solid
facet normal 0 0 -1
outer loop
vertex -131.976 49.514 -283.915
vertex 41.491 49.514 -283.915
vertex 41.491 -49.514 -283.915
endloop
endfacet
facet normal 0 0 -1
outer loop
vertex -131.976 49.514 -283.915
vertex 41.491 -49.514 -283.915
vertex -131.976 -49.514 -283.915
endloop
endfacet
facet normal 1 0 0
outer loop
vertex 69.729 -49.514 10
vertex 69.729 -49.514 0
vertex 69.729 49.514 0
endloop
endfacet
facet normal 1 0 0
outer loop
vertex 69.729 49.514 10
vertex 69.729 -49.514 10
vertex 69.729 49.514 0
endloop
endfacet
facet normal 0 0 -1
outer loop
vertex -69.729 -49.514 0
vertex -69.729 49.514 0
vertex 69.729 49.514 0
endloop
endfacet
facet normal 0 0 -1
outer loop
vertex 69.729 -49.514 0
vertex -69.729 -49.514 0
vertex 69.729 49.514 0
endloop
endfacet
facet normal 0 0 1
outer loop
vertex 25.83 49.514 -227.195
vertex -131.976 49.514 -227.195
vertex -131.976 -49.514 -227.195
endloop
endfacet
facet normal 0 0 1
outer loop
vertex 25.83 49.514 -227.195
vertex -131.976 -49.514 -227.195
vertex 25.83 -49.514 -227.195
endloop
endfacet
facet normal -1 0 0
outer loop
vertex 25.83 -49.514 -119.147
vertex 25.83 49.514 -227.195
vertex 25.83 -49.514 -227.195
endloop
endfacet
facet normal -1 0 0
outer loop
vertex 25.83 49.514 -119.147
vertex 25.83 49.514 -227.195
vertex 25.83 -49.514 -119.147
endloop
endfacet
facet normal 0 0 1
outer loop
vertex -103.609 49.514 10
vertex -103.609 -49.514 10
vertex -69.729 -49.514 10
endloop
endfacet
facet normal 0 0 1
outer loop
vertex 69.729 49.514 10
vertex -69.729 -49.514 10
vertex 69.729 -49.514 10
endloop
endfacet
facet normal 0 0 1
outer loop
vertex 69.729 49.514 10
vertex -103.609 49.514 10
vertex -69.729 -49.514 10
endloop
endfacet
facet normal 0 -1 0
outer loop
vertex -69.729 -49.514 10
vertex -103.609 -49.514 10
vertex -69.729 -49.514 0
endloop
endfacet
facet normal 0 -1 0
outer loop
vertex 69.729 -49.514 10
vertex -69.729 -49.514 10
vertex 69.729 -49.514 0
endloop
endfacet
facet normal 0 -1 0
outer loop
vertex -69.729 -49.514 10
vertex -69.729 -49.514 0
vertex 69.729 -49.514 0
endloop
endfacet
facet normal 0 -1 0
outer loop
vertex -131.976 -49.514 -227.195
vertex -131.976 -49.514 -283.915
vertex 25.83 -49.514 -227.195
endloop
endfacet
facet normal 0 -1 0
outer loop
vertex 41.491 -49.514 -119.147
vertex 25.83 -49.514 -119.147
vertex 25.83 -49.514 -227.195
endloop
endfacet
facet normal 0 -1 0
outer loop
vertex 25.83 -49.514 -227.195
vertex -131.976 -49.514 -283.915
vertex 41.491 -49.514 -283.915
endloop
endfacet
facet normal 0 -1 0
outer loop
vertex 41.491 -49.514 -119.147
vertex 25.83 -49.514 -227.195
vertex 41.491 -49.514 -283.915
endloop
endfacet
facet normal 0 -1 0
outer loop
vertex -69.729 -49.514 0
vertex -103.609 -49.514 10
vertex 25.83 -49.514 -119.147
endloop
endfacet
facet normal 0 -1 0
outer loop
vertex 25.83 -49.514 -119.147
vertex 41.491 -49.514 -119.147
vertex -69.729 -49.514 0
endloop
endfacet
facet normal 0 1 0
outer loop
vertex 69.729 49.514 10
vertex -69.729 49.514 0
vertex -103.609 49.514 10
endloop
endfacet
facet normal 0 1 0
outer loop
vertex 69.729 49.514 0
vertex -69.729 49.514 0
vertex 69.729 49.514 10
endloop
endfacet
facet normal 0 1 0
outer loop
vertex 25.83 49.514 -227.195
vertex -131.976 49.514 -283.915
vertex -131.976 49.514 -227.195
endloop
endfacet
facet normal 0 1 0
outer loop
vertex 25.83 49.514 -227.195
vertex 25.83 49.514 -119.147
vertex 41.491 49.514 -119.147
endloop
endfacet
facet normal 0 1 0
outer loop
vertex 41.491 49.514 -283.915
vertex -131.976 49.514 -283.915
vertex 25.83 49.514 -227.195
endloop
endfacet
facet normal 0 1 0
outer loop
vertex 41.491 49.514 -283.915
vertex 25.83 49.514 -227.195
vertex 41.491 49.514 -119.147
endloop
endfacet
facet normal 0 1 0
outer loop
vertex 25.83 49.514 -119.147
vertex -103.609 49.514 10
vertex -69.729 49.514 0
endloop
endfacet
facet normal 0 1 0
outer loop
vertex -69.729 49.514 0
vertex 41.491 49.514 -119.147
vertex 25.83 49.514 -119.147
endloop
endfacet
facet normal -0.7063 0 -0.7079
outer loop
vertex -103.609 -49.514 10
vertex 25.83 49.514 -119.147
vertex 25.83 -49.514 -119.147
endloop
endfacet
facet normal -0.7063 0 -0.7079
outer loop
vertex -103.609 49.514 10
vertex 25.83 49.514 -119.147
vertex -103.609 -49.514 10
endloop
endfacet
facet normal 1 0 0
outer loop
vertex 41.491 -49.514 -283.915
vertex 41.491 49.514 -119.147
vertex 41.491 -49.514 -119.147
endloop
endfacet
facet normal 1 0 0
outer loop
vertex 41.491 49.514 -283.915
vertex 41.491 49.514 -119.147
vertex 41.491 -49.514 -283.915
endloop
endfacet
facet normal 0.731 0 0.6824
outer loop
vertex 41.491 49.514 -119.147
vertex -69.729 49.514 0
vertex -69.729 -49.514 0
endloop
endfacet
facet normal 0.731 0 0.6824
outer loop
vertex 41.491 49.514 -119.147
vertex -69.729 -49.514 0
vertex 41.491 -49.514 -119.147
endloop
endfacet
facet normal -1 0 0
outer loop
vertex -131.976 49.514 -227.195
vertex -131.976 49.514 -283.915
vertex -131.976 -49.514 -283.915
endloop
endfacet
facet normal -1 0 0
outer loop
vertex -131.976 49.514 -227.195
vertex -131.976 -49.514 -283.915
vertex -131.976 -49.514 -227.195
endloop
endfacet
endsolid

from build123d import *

# Parameters (mm, degrees)
SKETCH1_W           = 139.457769838
SKETCH1_H           = 99.02864438
BOSS_EXTRUDE1_DEPTH = 10
BOSS_EXTRUDE2_DEPTH = 99.028644381
BOSS_EXTRUDE3_DEPTH = 99.028644381


with BuildPart() as part:
    # Sketch1 → Boss-Extrude1 (new body)
    with BuildSketch(Plane.XY):
        Rectangle(SKETCH1_W, SKETCH1_H)
    extrude(amount=BOSS_EXTRUDE1_DEPTH)

    # Sketch2 → Boss-Extrude2 (add)
    with BuildSketch(Plane(origin=(0, 49.51432219, 0), x_dir=(1, 0, 0), z_dir=(0, 1, 0))):
        Polygon((-69.728884919, 0), (41.491223437, 119.146703645), (25.829944634, 119.146703645), (-103.609221326, -10), (-69.728884919, -10), align=None)
    extrude(amount=-BOSS_EXTRUDE2_DEPTH)

    # Sketch3 → Boss-Extrude3 (add)
    with BuildSketch(Plane(origin=(0, 49.51432219, 0), x_dir=(1, 0, 0), z_dir=(0, 1, 0))):
        Polygon((41.491223437, 119.146703645), (41.491223437, 283.914864742), (-131.976237247, 283.914864742), (-131.976237247, 227.19452677), (25.829944634, 227.19452677), (25.829944634, 119.146703645), align=None)
    extrude(amount=-BOSS_EXTRUDE3_DEPTH)


solid = part.part
